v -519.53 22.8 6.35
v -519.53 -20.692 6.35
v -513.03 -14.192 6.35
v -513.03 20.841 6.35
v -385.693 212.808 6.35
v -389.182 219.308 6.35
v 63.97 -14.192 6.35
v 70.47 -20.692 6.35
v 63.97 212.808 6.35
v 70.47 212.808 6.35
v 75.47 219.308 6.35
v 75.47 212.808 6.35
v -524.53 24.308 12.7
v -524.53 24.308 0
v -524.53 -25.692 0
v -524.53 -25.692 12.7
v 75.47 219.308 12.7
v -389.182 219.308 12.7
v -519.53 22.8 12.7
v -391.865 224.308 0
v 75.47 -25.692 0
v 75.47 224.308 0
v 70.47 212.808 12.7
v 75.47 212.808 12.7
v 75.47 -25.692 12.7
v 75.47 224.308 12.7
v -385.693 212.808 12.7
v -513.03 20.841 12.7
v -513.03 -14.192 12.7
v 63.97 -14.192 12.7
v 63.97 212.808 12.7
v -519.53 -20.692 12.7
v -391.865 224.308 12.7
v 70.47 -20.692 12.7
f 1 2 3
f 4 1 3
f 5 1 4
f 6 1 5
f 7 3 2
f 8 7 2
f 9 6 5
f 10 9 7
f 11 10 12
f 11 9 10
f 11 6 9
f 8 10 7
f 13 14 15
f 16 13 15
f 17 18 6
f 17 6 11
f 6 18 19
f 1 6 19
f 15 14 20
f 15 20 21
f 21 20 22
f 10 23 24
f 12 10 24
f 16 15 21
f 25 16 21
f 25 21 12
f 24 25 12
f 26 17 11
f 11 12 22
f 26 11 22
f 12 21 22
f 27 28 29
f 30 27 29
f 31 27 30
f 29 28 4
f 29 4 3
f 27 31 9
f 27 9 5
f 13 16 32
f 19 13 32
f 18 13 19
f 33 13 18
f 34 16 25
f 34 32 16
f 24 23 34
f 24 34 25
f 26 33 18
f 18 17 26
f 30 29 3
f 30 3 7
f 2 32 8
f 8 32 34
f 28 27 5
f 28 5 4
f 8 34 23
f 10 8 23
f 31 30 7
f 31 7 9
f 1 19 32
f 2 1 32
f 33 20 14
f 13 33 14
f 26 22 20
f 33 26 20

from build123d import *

# Parameters (mm, degrees)
BOSS_EXTRUDE1_DEPTH = 12.7
CUT_EXTRUDE1_DEPTH  = 6.35
SKETCH5_W           = 41.48623644
SKETCH5_H           = 6.5
CUT_EXTRUDE2_DEPTH  = 6.35


with BuildPart() as part:
    # Sketch1 → Boss-Extrude1 (new body)
    with BuildSketch(Plane.XY):
        Polygon((-524.529885057, -25.691954023), (75.470114943, -25.691954023), (75.470114943, 224.308045977), (-391.864893443, 224.308045977), (-524.529885057, 24.308045977), align=None)
    extrude(amount=BOSS_EXTRUDE1_DEPTH)

    # Sketch4 → Cut-Extrude1 (cut)
    with BuildSketch(Plane.XY.offset(12.7)):
        Polygon((-519.529885057, 22.800489254), (-519.529885057, -20.691954023), (70.470114943, -20.691954023), (70.470114943, 219.308045977), (-389.181518234, 219.308045977), align=None)
        Polygon((-513.029885057, 20.840665514), (-513.029885057, -14.191954023), (63.970114943, -14.191954023), (63.970114943, 212.808045977), (-385.693130461, 212.808045977), align=None, mode=Mode.SUBTRACT)
    extrude(amount=-CUT_EXTRUDE1_DEPTH, mode=Mode.SUBTRACT)

    # Sketch5 → Cut-Extrude2 (cut)
    with BuildSketch(Plane.XY.offset(12.7)):
        with Locations((65.370018612, 216.058045977)):
            Rectangle(SKETCH5_W, SKETCH5_H)
    extrude(amount=-CUT_EXTRUDE2_DEPTH, mode=Mode.SUBTRACT)


solid = part.part
